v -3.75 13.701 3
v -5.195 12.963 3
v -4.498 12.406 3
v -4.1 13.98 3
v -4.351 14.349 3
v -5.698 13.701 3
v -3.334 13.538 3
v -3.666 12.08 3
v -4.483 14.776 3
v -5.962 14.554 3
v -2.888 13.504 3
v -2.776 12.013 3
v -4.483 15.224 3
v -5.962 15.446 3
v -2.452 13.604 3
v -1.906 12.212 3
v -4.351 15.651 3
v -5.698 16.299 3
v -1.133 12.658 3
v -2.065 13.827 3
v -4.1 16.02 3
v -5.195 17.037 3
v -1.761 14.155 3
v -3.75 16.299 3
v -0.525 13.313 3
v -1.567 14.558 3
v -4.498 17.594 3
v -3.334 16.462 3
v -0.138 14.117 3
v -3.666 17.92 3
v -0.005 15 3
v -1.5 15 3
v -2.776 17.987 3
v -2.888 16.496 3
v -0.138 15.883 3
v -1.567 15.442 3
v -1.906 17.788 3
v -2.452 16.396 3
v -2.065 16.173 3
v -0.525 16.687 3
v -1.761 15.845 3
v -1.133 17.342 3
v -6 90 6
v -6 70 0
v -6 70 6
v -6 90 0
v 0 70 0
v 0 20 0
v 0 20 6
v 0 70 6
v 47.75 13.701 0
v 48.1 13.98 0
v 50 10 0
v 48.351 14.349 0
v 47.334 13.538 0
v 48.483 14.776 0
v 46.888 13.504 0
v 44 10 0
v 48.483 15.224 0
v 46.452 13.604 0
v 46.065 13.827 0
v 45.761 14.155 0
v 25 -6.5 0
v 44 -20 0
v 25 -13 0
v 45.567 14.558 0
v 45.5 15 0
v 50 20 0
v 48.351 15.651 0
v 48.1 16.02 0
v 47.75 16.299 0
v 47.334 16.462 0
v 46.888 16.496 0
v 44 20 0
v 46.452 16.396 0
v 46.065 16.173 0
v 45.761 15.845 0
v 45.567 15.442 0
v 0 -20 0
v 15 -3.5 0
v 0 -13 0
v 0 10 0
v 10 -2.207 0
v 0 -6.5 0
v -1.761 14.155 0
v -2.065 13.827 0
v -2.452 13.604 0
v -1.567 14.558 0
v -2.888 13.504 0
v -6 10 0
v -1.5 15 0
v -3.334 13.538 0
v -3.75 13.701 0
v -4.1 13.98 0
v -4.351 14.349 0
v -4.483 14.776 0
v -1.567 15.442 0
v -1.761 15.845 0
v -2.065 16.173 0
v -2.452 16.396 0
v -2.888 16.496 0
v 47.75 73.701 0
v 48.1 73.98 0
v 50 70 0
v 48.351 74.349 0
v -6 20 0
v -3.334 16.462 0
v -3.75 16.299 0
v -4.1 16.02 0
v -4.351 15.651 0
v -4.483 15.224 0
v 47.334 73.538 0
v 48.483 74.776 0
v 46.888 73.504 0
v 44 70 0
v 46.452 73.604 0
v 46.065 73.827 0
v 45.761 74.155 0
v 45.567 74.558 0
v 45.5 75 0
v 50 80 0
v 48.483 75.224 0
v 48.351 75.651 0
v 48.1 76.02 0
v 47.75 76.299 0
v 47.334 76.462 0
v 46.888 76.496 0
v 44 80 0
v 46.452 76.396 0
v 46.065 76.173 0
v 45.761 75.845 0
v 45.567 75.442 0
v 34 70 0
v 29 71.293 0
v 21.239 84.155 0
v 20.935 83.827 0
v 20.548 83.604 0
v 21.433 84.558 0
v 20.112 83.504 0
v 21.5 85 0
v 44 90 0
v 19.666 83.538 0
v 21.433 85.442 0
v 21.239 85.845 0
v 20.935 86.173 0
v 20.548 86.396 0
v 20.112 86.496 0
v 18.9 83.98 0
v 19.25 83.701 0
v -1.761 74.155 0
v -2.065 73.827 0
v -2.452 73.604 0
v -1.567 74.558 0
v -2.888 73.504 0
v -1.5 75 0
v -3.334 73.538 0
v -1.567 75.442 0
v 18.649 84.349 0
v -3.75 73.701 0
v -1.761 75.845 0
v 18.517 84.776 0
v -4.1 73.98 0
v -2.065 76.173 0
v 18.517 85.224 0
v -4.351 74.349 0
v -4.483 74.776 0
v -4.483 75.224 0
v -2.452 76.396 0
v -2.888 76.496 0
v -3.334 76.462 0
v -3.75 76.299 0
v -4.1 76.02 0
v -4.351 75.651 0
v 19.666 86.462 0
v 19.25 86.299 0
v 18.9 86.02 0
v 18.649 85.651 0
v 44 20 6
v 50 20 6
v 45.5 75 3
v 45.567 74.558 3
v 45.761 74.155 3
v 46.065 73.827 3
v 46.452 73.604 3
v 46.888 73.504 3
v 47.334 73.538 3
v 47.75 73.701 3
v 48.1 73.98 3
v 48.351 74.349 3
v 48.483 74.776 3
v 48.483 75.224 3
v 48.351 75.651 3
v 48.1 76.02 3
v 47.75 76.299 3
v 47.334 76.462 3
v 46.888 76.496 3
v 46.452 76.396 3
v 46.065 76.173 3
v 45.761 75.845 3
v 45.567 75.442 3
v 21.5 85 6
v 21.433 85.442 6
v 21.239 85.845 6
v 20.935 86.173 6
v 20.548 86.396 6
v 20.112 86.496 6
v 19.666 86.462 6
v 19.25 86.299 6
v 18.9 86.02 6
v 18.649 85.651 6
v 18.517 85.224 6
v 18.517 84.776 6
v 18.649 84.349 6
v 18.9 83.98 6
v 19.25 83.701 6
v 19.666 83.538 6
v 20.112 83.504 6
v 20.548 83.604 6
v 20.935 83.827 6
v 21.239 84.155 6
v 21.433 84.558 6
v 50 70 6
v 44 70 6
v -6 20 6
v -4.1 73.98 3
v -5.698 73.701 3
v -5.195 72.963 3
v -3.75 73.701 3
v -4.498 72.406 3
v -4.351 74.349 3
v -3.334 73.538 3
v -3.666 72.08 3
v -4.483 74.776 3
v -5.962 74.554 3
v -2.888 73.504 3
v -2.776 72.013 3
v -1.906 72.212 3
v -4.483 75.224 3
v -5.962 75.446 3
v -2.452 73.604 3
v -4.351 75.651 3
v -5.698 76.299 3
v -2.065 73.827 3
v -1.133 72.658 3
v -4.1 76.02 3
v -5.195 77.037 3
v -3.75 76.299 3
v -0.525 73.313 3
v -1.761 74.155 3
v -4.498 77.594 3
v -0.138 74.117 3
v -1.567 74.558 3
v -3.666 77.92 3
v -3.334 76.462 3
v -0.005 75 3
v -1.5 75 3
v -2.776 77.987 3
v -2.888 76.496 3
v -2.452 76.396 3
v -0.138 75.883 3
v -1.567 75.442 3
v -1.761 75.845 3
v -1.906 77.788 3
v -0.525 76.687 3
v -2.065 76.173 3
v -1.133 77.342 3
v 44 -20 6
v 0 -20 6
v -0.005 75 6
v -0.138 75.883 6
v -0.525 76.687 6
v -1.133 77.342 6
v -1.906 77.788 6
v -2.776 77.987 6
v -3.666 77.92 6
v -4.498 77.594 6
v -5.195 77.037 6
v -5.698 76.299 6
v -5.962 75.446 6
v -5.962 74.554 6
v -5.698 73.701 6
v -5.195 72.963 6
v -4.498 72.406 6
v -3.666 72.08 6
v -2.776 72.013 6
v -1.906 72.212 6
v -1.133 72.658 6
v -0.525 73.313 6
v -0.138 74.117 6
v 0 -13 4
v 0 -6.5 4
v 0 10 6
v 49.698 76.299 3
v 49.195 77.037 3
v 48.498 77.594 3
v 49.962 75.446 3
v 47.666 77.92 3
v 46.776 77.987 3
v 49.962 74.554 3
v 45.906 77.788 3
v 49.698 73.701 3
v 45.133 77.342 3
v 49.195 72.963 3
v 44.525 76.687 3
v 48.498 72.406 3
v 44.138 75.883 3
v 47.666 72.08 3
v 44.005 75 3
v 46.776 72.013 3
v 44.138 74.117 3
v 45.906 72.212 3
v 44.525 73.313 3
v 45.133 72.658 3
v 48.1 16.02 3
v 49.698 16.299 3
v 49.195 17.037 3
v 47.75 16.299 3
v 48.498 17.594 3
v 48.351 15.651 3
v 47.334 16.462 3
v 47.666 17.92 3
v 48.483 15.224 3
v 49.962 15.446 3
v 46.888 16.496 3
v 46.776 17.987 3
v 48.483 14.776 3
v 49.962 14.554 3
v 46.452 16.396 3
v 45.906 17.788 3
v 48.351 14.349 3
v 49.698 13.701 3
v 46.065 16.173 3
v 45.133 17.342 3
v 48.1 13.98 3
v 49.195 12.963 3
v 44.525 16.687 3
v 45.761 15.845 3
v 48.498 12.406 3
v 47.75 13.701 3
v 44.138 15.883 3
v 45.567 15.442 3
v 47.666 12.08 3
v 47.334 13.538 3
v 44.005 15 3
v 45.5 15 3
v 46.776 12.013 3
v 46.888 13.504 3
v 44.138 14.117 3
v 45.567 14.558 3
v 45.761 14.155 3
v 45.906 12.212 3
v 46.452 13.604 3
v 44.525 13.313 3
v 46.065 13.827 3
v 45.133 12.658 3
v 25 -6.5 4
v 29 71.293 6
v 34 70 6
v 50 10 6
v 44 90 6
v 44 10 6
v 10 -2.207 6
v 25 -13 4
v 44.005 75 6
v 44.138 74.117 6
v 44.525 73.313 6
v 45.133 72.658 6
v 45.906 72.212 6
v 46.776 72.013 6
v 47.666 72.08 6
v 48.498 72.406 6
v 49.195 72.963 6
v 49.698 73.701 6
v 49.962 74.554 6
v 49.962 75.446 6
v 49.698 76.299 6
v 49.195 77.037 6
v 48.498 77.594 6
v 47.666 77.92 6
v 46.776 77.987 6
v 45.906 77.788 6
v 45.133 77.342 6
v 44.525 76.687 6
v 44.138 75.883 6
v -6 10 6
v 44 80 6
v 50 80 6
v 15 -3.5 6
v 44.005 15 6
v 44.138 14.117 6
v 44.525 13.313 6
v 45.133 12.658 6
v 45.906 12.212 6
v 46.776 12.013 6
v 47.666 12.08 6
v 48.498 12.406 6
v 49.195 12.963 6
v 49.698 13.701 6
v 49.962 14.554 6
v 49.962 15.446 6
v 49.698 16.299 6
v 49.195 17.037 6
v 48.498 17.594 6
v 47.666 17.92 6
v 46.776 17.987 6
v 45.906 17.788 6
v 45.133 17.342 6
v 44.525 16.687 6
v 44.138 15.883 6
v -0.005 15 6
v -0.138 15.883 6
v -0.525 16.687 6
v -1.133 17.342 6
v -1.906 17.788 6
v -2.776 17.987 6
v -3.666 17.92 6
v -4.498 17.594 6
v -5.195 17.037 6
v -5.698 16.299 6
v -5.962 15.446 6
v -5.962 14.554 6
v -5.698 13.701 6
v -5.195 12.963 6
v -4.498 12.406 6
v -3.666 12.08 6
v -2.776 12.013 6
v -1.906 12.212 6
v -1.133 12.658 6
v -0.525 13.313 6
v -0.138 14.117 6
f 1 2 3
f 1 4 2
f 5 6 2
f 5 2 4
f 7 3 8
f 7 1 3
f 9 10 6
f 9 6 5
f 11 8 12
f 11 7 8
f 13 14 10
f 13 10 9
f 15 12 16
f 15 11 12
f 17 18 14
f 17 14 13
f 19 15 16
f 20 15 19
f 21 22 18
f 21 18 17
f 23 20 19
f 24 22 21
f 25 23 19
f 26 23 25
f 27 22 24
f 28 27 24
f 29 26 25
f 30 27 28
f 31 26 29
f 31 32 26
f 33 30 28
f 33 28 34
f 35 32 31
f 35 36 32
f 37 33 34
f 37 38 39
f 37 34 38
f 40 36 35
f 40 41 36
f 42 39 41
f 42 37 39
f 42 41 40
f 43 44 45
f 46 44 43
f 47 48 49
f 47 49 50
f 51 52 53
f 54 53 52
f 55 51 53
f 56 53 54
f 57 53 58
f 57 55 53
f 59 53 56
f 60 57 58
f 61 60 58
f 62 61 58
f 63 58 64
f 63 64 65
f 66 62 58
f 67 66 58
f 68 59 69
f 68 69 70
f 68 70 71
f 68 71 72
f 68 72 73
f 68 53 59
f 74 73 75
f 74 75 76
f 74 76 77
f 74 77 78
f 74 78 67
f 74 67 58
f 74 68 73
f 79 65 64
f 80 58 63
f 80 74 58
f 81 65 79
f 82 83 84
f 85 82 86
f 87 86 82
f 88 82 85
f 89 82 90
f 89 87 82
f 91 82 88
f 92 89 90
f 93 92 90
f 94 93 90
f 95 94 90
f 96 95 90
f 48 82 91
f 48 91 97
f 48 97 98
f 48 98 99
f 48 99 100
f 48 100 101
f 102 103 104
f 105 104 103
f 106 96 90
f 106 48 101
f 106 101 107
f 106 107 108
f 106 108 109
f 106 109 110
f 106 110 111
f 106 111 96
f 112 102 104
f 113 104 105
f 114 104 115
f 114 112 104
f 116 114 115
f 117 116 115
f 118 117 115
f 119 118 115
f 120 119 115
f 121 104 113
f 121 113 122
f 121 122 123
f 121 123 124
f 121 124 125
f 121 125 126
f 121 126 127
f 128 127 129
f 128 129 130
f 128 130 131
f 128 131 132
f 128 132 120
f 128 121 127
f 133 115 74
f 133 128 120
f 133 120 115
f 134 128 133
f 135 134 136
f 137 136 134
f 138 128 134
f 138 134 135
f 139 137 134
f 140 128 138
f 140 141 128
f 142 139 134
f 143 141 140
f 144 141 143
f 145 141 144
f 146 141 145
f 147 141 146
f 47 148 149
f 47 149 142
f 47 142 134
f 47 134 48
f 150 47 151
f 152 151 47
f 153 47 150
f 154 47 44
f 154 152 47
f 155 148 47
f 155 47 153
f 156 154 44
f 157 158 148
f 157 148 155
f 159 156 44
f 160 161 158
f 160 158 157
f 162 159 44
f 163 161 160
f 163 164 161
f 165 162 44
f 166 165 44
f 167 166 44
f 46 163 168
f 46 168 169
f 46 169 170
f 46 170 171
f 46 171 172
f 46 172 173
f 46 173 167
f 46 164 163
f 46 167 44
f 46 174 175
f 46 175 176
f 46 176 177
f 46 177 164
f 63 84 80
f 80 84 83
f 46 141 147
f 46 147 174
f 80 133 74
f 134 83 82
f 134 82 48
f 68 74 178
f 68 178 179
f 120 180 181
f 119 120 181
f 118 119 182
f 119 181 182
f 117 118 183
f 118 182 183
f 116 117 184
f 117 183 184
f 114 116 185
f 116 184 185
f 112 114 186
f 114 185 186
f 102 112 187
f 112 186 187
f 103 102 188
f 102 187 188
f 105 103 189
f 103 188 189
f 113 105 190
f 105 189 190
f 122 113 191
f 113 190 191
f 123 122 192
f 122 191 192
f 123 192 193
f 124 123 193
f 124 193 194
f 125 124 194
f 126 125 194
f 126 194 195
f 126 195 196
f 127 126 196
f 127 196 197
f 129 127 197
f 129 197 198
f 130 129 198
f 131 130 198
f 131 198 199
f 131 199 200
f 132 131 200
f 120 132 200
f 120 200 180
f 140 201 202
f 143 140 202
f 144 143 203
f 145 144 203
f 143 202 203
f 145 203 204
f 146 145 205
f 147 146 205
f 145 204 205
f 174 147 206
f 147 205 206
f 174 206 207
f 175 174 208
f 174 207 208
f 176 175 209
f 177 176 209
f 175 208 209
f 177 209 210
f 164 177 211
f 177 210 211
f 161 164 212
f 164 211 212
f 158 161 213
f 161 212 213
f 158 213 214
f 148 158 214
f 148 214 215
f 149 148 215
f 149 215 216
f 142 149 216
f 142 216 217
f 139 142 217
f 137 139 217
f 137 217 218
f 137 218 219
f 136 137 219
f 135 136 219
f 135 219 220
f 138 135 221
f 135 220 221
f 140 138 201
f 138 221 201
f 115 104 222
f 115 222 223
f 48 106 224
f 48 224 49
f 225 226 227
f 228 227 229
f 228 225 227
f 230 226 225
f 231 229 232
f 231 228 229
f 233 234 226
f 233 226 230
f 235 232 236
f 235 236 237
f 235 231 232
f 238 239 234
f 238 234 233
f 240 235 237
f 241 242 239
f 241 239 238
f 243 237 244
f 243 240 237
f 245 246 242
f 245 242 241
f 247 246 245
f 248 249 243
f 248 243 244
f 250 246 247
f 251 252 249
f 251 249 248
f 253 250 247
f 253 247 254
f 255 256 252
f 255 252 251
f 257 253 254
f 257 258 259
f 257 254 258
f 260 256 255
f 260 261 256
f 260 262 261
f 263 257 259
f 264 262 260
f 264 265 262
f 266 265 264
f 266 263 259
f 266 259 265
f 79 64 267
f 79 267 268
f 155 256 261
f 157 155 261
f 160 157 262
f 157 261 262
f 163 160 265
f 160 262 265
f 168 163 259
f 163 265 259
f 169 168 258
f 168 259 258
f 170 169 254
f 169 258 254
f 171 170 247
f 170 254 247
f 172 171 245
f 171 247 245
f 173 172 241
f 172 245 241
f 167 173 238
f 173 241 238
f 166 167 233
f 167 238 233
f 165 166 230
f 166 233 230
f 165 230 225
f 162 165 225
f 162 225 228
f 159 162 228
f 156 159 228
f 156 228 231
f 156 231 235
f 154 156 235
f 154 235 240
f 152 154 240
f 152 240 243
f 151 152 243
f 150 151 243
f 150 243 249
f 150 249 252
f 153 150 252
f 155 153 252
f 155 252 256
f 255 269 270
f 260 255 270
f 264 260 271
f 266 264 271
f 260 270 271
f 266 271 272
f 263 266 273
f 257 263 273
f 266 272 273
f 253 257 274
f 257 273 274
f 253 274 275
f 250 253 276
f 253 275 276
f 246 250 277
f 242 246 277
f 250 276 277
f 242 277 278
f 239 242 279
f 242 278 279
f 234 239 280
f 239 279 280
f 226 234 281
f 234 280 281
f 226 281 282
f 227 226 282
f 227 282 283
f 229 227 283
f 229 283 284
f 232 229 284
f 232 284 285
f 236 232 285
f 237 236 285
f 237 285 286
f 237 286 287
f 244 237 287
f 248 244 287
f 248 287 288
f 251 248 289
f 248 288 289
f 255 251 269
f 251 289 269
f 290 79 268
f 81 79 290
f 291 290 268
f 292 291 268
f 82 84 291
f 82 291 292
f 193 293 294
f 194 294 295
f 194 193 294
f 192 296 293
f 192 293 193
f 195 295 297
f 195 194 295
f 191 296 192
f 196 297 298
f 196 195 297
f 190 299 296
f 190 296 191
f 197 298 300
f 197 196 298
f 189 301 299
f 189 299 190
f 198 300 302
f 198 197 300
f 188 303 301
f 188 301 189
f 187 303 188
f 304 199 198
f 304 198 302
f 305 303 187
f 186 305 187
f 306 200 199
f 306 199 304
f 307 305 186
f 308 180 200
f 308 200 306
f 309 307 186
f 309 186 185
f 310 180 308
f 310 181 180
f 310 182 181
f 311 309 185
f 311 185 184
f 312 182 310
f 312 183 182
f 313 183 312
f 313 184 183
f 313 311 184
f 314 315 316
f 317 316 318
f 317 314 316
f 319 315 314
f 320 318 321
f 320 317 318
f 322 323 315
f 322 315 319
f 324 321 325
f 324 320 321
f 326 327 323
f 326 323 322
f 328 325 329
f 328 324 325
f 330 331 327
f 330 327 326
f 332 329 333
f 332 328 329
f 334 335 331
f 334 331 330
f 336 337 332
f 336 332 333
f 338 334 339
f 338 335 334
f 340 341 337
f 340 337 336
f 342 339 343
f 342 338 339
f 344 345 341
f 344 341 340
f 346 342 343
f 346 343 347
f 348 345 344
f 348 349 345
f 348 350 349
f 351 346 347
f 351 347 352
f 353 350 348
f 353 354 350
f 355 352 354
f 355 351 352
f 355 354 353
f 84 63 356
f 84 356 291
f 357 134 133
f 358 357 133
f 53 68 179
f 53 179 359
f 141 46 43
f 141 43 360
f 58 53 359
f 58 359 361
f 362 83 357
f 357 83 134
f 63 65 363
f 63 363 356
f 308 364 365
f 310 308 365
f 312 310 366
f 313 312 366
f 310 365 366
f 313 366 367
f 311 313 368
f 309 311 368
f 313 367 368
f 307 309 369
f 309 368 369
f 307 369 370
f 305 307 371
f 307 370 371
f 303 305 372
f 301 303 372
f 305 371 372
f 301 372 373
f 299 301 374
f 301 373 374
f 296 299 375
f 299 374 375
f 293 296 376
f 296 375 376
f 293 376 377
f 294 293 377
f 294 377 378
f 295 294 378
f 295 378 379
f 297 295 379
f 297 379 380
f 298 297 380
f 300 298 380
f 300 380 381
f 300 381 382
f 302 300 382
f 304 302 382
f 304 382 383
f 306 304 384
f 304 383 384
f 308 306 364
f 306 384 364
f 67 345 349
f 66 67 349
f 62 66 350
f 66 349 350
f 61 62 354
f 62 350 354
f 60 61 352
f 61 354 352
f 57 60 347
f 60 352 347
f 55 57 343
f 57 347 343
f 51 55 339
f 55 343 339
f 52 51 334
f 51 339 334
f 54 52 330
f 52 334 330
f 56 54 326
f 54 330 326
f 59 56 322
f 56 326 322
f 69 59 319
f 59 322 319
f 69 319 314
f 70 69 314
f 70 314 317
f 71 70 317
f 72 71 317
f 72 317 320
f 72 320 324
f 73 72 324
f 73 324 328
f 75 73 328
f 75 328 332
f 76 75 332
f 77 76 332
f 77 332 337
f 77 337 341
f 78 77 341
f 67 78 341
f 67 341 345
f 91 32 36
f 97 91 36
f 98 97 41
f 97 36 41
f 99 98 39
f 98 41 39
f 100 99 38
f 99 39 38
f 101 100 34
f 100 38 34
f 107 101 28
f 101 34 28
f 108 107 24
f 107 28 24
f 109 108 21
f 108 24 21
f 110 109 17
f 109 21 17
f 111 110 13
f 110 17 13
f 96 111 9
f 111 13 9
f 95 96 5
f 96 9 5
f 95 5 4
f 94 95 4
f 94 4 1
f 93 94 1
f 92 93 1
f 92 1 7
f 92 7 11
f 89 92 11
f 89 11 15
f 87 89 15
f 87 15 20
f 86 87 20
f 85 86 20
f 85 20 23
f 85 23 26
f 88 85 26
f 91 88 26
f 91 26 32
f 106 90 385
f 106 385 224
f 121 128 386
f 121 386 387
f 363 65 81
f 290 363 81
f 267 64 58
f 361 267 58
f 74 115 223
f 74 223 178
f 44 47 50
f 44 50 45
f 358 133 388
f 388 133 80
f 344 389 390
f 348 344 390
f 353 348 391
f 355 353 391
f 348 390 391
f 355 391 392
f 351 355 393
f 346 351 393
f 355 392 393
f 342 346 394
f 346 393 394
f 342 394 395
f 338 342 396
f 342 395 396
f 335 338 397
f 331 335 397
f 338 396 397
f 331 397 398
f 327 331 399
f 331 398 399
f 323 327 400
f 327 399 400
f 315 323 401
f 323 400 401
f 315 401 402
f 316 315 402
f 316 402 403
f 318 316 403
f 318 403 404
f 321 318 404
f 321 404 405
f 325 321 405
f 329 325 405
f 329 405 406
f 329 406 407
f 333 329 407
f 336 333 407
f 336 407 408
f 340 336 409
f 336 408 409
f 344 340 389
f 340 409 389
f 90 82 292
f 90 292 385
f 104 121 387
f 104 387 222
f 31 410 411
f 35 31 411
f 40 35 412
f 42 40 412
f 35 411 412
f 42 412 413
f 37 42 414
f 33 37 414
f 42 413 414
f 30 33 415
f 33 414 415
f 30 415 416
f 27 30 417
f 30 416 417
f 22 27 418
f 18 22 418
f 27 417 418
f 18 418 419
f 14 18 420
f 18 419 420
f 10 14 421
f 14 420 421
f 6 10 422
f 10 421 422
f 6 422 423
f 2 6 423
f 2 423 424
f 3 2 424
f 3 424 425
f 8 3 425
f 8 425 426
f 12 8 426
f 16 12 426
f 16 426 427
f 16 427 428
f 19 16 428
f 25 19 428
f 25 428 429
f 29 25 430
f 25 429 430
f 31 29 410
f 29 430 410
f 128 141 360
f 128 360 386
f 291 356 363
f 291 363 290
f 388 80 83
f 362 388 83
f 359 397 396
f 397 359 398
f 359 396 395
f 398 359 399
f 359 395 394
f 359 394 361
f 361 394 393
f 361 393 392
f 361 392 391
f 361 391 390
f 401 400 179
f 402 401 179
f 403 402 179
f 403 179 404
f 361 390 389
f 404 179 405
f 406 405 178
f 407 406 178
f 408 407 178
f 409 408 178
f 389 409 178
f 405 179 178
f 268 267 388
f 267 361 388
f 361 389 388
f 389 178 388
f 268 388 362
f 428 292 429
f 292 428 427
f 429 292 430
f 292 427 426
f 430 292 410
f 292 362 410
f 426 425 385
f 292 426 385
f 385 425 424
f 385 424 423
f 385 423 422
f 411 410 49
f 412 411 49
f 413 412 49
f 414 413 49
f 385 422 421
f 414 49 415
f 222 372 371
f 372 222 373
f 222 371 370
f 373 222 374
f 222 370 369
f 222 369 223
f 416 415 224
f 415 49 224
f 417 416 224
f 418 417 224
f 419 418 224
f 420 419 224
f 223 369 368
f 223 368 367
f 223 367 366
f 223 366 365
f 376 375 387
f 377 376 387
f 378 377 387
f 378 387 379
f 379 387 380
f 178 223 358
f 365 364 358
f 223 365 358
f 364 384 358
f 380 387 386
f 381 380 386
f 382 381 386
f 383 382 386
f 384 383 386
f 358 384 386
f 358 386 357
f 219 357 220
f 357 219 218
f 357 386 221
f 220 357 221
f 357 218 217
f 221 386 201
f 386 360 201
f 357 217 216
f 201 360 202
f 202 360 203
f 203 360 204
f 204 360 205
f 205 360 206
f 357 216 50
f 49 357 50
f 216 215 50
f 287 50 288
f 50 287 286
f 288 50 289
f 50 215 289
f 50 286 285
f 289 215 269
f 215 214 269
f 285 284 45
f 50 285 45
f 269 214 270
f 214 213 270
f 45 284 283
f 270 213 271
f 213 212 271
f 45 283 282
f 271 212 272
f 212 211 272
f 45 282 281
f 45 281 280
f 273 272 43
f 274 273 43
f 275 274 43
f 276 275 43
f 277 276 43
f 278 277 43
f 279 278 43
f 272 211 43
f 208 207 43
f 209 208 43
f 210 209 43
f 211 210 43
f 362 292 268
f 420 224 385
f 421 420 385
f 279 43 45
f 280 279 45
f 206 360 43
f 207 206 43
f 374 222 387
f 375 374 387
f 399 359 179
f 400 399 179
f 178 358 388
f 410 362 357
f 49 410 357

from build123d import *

# Parameters (mm, degrees)
BOSS_EXTRU_1_DEPTH      = 6
ESQUISSE2_R             = 1.5
ENL_V_MAT_EXTRU_1_DEPTH = 6
ESQUISSE6_R             = 1.5
ENL_V_MAT_EXTRU_4_DEPTH = 6
ESQUISSE7_R             = 2.995
ENL_V_MAT_EXTRU_5_DEPTH = 3
ESQUISSE8_W             = 44
ESQUISSE8_H             = 20
BOSS_EXTRU_2_DEPTH      = 6
ESQUISSE9_W             = 25
ESQUISSE9_H             = 6.5
ENL_V_MAT_EXTRU_6_DEPTH = 4
ENL_V_MAT_EXTRU_7_DEPTH = 6


with BuildPart() as part:
    # Esquisse1 → Boss.-Extru.1 (new body)
    with BuildSketch(Plane.XY):
        Polygon((-6, 70), (-6, 90), (44, 90), (44, 80), (50, 80), (50, 70), (44, 70), (44, 20), (50, 20), (50, 10), (44, 10), (44, 0), (0, 0), (0, 10), (-6, 10), (-6, 20), (0, 20), (0, 70), align=None)
    extrude(amount=BOSS_EXTRU_1_DEPTH)

    # Esquisse2 → Enlèv. mat.-Extru.1 (cut)
    with BuildSketch(Plane.XY.offset(6)):
        with Locations((20, 85)):
            Circle(ESQUISSE2_R)
    extrude(amount=-ENL_V_MAT_EXTRU_1_DEPTH, mode=Mode.SUBTRACT)

    # Esquisse6 → Enlèv. mat.-Extru.4 (cut)
    with BuildSketch(Plane.XY.offset(6)):
        with Locations((-3, 75)):
            Circle(ESQUISSE6_R)
        with Locations((-3, 15)):
            Circle(ESQUISSE6_R)
        with Locations(Location((47, 15, 0), (0, 0, 180))):
            Circle(ESQUISSE6_R)
        with Locations(Location((47, 75, 0), (0, 0, 180))):
            Circle(ESQUISSE6_R)
    extrude(amount=-ENL_V_MAT_EXTRU_4_DEPTH, mode=Mode.SUBTRACT)

    # Esquisse7 → Enlèv. mat.-Extru.5 (cut)
    with BuildSketch(Plane.XY.offset(6)):
        with Locations((-3, 15)):
            Circle(ESQUISSE7_R)
        with Locations((-3, 75)):
            Circle(ESQUISSE7_R)
        with Locations(Location((47, 75, 0), (0, 0, 180))):
            Circle(ESQUISSE7_R)
        with Locations(Location((47, 15, 0), (0, 0, 180))):
            Circle(ESQUISSE7_R)
    extrude(amount=-ENL_V_MAT_EXTRU_5_DEPTH, mode=Mode.SUBTRACT)

    # Esquisse8 → Boss.-Extru.2 (add)
    with BuildSketch(Plane(origin=(0, 0, 0), x_dir=(-1, 0, 0), z_dir=(0, 0, -1))):
        with Locations((-22, -10)):
            Rectangle(ESQUISSE8_W, ESQUISSE8_H)
    extrude(amount=-BOSS_EXTRU_2_DEPTH)

    # Esquisse9 → Enlèv. mat.-Extru.6 (cut)
    with BuildSketch(Plane(origin=(0, 0, 0), x_dir=(-1, 0, 0), z_dir=(0, 0, -1))):
        with Locations((-12.5, -9.75)):
            Rectangle(ESQUISSE9_W, ESQUISSE9_H)
    extrude(amount=-ENL_V_MAT_EXTRU_6_DEPTH, mode=Mode.SUBTRACT)

    # Esquisse10 → Enlèv. mat.-Extru.7 (cut)
    with BuildSketch(Plane(origin=(0, 0, 0), x_dir=(-1, 0, 0), z_dir=(0, 0, -1))):
        Polygon((-34, 70), (-15, -3.5), (-10, -2.207482993), (-29, 71.292517007), align=None)
    extrude(amount=-ENL_V_MAT_EXTRU_7_DEPTH, mode=Mode.SUBTRACT)


solid = part.part
